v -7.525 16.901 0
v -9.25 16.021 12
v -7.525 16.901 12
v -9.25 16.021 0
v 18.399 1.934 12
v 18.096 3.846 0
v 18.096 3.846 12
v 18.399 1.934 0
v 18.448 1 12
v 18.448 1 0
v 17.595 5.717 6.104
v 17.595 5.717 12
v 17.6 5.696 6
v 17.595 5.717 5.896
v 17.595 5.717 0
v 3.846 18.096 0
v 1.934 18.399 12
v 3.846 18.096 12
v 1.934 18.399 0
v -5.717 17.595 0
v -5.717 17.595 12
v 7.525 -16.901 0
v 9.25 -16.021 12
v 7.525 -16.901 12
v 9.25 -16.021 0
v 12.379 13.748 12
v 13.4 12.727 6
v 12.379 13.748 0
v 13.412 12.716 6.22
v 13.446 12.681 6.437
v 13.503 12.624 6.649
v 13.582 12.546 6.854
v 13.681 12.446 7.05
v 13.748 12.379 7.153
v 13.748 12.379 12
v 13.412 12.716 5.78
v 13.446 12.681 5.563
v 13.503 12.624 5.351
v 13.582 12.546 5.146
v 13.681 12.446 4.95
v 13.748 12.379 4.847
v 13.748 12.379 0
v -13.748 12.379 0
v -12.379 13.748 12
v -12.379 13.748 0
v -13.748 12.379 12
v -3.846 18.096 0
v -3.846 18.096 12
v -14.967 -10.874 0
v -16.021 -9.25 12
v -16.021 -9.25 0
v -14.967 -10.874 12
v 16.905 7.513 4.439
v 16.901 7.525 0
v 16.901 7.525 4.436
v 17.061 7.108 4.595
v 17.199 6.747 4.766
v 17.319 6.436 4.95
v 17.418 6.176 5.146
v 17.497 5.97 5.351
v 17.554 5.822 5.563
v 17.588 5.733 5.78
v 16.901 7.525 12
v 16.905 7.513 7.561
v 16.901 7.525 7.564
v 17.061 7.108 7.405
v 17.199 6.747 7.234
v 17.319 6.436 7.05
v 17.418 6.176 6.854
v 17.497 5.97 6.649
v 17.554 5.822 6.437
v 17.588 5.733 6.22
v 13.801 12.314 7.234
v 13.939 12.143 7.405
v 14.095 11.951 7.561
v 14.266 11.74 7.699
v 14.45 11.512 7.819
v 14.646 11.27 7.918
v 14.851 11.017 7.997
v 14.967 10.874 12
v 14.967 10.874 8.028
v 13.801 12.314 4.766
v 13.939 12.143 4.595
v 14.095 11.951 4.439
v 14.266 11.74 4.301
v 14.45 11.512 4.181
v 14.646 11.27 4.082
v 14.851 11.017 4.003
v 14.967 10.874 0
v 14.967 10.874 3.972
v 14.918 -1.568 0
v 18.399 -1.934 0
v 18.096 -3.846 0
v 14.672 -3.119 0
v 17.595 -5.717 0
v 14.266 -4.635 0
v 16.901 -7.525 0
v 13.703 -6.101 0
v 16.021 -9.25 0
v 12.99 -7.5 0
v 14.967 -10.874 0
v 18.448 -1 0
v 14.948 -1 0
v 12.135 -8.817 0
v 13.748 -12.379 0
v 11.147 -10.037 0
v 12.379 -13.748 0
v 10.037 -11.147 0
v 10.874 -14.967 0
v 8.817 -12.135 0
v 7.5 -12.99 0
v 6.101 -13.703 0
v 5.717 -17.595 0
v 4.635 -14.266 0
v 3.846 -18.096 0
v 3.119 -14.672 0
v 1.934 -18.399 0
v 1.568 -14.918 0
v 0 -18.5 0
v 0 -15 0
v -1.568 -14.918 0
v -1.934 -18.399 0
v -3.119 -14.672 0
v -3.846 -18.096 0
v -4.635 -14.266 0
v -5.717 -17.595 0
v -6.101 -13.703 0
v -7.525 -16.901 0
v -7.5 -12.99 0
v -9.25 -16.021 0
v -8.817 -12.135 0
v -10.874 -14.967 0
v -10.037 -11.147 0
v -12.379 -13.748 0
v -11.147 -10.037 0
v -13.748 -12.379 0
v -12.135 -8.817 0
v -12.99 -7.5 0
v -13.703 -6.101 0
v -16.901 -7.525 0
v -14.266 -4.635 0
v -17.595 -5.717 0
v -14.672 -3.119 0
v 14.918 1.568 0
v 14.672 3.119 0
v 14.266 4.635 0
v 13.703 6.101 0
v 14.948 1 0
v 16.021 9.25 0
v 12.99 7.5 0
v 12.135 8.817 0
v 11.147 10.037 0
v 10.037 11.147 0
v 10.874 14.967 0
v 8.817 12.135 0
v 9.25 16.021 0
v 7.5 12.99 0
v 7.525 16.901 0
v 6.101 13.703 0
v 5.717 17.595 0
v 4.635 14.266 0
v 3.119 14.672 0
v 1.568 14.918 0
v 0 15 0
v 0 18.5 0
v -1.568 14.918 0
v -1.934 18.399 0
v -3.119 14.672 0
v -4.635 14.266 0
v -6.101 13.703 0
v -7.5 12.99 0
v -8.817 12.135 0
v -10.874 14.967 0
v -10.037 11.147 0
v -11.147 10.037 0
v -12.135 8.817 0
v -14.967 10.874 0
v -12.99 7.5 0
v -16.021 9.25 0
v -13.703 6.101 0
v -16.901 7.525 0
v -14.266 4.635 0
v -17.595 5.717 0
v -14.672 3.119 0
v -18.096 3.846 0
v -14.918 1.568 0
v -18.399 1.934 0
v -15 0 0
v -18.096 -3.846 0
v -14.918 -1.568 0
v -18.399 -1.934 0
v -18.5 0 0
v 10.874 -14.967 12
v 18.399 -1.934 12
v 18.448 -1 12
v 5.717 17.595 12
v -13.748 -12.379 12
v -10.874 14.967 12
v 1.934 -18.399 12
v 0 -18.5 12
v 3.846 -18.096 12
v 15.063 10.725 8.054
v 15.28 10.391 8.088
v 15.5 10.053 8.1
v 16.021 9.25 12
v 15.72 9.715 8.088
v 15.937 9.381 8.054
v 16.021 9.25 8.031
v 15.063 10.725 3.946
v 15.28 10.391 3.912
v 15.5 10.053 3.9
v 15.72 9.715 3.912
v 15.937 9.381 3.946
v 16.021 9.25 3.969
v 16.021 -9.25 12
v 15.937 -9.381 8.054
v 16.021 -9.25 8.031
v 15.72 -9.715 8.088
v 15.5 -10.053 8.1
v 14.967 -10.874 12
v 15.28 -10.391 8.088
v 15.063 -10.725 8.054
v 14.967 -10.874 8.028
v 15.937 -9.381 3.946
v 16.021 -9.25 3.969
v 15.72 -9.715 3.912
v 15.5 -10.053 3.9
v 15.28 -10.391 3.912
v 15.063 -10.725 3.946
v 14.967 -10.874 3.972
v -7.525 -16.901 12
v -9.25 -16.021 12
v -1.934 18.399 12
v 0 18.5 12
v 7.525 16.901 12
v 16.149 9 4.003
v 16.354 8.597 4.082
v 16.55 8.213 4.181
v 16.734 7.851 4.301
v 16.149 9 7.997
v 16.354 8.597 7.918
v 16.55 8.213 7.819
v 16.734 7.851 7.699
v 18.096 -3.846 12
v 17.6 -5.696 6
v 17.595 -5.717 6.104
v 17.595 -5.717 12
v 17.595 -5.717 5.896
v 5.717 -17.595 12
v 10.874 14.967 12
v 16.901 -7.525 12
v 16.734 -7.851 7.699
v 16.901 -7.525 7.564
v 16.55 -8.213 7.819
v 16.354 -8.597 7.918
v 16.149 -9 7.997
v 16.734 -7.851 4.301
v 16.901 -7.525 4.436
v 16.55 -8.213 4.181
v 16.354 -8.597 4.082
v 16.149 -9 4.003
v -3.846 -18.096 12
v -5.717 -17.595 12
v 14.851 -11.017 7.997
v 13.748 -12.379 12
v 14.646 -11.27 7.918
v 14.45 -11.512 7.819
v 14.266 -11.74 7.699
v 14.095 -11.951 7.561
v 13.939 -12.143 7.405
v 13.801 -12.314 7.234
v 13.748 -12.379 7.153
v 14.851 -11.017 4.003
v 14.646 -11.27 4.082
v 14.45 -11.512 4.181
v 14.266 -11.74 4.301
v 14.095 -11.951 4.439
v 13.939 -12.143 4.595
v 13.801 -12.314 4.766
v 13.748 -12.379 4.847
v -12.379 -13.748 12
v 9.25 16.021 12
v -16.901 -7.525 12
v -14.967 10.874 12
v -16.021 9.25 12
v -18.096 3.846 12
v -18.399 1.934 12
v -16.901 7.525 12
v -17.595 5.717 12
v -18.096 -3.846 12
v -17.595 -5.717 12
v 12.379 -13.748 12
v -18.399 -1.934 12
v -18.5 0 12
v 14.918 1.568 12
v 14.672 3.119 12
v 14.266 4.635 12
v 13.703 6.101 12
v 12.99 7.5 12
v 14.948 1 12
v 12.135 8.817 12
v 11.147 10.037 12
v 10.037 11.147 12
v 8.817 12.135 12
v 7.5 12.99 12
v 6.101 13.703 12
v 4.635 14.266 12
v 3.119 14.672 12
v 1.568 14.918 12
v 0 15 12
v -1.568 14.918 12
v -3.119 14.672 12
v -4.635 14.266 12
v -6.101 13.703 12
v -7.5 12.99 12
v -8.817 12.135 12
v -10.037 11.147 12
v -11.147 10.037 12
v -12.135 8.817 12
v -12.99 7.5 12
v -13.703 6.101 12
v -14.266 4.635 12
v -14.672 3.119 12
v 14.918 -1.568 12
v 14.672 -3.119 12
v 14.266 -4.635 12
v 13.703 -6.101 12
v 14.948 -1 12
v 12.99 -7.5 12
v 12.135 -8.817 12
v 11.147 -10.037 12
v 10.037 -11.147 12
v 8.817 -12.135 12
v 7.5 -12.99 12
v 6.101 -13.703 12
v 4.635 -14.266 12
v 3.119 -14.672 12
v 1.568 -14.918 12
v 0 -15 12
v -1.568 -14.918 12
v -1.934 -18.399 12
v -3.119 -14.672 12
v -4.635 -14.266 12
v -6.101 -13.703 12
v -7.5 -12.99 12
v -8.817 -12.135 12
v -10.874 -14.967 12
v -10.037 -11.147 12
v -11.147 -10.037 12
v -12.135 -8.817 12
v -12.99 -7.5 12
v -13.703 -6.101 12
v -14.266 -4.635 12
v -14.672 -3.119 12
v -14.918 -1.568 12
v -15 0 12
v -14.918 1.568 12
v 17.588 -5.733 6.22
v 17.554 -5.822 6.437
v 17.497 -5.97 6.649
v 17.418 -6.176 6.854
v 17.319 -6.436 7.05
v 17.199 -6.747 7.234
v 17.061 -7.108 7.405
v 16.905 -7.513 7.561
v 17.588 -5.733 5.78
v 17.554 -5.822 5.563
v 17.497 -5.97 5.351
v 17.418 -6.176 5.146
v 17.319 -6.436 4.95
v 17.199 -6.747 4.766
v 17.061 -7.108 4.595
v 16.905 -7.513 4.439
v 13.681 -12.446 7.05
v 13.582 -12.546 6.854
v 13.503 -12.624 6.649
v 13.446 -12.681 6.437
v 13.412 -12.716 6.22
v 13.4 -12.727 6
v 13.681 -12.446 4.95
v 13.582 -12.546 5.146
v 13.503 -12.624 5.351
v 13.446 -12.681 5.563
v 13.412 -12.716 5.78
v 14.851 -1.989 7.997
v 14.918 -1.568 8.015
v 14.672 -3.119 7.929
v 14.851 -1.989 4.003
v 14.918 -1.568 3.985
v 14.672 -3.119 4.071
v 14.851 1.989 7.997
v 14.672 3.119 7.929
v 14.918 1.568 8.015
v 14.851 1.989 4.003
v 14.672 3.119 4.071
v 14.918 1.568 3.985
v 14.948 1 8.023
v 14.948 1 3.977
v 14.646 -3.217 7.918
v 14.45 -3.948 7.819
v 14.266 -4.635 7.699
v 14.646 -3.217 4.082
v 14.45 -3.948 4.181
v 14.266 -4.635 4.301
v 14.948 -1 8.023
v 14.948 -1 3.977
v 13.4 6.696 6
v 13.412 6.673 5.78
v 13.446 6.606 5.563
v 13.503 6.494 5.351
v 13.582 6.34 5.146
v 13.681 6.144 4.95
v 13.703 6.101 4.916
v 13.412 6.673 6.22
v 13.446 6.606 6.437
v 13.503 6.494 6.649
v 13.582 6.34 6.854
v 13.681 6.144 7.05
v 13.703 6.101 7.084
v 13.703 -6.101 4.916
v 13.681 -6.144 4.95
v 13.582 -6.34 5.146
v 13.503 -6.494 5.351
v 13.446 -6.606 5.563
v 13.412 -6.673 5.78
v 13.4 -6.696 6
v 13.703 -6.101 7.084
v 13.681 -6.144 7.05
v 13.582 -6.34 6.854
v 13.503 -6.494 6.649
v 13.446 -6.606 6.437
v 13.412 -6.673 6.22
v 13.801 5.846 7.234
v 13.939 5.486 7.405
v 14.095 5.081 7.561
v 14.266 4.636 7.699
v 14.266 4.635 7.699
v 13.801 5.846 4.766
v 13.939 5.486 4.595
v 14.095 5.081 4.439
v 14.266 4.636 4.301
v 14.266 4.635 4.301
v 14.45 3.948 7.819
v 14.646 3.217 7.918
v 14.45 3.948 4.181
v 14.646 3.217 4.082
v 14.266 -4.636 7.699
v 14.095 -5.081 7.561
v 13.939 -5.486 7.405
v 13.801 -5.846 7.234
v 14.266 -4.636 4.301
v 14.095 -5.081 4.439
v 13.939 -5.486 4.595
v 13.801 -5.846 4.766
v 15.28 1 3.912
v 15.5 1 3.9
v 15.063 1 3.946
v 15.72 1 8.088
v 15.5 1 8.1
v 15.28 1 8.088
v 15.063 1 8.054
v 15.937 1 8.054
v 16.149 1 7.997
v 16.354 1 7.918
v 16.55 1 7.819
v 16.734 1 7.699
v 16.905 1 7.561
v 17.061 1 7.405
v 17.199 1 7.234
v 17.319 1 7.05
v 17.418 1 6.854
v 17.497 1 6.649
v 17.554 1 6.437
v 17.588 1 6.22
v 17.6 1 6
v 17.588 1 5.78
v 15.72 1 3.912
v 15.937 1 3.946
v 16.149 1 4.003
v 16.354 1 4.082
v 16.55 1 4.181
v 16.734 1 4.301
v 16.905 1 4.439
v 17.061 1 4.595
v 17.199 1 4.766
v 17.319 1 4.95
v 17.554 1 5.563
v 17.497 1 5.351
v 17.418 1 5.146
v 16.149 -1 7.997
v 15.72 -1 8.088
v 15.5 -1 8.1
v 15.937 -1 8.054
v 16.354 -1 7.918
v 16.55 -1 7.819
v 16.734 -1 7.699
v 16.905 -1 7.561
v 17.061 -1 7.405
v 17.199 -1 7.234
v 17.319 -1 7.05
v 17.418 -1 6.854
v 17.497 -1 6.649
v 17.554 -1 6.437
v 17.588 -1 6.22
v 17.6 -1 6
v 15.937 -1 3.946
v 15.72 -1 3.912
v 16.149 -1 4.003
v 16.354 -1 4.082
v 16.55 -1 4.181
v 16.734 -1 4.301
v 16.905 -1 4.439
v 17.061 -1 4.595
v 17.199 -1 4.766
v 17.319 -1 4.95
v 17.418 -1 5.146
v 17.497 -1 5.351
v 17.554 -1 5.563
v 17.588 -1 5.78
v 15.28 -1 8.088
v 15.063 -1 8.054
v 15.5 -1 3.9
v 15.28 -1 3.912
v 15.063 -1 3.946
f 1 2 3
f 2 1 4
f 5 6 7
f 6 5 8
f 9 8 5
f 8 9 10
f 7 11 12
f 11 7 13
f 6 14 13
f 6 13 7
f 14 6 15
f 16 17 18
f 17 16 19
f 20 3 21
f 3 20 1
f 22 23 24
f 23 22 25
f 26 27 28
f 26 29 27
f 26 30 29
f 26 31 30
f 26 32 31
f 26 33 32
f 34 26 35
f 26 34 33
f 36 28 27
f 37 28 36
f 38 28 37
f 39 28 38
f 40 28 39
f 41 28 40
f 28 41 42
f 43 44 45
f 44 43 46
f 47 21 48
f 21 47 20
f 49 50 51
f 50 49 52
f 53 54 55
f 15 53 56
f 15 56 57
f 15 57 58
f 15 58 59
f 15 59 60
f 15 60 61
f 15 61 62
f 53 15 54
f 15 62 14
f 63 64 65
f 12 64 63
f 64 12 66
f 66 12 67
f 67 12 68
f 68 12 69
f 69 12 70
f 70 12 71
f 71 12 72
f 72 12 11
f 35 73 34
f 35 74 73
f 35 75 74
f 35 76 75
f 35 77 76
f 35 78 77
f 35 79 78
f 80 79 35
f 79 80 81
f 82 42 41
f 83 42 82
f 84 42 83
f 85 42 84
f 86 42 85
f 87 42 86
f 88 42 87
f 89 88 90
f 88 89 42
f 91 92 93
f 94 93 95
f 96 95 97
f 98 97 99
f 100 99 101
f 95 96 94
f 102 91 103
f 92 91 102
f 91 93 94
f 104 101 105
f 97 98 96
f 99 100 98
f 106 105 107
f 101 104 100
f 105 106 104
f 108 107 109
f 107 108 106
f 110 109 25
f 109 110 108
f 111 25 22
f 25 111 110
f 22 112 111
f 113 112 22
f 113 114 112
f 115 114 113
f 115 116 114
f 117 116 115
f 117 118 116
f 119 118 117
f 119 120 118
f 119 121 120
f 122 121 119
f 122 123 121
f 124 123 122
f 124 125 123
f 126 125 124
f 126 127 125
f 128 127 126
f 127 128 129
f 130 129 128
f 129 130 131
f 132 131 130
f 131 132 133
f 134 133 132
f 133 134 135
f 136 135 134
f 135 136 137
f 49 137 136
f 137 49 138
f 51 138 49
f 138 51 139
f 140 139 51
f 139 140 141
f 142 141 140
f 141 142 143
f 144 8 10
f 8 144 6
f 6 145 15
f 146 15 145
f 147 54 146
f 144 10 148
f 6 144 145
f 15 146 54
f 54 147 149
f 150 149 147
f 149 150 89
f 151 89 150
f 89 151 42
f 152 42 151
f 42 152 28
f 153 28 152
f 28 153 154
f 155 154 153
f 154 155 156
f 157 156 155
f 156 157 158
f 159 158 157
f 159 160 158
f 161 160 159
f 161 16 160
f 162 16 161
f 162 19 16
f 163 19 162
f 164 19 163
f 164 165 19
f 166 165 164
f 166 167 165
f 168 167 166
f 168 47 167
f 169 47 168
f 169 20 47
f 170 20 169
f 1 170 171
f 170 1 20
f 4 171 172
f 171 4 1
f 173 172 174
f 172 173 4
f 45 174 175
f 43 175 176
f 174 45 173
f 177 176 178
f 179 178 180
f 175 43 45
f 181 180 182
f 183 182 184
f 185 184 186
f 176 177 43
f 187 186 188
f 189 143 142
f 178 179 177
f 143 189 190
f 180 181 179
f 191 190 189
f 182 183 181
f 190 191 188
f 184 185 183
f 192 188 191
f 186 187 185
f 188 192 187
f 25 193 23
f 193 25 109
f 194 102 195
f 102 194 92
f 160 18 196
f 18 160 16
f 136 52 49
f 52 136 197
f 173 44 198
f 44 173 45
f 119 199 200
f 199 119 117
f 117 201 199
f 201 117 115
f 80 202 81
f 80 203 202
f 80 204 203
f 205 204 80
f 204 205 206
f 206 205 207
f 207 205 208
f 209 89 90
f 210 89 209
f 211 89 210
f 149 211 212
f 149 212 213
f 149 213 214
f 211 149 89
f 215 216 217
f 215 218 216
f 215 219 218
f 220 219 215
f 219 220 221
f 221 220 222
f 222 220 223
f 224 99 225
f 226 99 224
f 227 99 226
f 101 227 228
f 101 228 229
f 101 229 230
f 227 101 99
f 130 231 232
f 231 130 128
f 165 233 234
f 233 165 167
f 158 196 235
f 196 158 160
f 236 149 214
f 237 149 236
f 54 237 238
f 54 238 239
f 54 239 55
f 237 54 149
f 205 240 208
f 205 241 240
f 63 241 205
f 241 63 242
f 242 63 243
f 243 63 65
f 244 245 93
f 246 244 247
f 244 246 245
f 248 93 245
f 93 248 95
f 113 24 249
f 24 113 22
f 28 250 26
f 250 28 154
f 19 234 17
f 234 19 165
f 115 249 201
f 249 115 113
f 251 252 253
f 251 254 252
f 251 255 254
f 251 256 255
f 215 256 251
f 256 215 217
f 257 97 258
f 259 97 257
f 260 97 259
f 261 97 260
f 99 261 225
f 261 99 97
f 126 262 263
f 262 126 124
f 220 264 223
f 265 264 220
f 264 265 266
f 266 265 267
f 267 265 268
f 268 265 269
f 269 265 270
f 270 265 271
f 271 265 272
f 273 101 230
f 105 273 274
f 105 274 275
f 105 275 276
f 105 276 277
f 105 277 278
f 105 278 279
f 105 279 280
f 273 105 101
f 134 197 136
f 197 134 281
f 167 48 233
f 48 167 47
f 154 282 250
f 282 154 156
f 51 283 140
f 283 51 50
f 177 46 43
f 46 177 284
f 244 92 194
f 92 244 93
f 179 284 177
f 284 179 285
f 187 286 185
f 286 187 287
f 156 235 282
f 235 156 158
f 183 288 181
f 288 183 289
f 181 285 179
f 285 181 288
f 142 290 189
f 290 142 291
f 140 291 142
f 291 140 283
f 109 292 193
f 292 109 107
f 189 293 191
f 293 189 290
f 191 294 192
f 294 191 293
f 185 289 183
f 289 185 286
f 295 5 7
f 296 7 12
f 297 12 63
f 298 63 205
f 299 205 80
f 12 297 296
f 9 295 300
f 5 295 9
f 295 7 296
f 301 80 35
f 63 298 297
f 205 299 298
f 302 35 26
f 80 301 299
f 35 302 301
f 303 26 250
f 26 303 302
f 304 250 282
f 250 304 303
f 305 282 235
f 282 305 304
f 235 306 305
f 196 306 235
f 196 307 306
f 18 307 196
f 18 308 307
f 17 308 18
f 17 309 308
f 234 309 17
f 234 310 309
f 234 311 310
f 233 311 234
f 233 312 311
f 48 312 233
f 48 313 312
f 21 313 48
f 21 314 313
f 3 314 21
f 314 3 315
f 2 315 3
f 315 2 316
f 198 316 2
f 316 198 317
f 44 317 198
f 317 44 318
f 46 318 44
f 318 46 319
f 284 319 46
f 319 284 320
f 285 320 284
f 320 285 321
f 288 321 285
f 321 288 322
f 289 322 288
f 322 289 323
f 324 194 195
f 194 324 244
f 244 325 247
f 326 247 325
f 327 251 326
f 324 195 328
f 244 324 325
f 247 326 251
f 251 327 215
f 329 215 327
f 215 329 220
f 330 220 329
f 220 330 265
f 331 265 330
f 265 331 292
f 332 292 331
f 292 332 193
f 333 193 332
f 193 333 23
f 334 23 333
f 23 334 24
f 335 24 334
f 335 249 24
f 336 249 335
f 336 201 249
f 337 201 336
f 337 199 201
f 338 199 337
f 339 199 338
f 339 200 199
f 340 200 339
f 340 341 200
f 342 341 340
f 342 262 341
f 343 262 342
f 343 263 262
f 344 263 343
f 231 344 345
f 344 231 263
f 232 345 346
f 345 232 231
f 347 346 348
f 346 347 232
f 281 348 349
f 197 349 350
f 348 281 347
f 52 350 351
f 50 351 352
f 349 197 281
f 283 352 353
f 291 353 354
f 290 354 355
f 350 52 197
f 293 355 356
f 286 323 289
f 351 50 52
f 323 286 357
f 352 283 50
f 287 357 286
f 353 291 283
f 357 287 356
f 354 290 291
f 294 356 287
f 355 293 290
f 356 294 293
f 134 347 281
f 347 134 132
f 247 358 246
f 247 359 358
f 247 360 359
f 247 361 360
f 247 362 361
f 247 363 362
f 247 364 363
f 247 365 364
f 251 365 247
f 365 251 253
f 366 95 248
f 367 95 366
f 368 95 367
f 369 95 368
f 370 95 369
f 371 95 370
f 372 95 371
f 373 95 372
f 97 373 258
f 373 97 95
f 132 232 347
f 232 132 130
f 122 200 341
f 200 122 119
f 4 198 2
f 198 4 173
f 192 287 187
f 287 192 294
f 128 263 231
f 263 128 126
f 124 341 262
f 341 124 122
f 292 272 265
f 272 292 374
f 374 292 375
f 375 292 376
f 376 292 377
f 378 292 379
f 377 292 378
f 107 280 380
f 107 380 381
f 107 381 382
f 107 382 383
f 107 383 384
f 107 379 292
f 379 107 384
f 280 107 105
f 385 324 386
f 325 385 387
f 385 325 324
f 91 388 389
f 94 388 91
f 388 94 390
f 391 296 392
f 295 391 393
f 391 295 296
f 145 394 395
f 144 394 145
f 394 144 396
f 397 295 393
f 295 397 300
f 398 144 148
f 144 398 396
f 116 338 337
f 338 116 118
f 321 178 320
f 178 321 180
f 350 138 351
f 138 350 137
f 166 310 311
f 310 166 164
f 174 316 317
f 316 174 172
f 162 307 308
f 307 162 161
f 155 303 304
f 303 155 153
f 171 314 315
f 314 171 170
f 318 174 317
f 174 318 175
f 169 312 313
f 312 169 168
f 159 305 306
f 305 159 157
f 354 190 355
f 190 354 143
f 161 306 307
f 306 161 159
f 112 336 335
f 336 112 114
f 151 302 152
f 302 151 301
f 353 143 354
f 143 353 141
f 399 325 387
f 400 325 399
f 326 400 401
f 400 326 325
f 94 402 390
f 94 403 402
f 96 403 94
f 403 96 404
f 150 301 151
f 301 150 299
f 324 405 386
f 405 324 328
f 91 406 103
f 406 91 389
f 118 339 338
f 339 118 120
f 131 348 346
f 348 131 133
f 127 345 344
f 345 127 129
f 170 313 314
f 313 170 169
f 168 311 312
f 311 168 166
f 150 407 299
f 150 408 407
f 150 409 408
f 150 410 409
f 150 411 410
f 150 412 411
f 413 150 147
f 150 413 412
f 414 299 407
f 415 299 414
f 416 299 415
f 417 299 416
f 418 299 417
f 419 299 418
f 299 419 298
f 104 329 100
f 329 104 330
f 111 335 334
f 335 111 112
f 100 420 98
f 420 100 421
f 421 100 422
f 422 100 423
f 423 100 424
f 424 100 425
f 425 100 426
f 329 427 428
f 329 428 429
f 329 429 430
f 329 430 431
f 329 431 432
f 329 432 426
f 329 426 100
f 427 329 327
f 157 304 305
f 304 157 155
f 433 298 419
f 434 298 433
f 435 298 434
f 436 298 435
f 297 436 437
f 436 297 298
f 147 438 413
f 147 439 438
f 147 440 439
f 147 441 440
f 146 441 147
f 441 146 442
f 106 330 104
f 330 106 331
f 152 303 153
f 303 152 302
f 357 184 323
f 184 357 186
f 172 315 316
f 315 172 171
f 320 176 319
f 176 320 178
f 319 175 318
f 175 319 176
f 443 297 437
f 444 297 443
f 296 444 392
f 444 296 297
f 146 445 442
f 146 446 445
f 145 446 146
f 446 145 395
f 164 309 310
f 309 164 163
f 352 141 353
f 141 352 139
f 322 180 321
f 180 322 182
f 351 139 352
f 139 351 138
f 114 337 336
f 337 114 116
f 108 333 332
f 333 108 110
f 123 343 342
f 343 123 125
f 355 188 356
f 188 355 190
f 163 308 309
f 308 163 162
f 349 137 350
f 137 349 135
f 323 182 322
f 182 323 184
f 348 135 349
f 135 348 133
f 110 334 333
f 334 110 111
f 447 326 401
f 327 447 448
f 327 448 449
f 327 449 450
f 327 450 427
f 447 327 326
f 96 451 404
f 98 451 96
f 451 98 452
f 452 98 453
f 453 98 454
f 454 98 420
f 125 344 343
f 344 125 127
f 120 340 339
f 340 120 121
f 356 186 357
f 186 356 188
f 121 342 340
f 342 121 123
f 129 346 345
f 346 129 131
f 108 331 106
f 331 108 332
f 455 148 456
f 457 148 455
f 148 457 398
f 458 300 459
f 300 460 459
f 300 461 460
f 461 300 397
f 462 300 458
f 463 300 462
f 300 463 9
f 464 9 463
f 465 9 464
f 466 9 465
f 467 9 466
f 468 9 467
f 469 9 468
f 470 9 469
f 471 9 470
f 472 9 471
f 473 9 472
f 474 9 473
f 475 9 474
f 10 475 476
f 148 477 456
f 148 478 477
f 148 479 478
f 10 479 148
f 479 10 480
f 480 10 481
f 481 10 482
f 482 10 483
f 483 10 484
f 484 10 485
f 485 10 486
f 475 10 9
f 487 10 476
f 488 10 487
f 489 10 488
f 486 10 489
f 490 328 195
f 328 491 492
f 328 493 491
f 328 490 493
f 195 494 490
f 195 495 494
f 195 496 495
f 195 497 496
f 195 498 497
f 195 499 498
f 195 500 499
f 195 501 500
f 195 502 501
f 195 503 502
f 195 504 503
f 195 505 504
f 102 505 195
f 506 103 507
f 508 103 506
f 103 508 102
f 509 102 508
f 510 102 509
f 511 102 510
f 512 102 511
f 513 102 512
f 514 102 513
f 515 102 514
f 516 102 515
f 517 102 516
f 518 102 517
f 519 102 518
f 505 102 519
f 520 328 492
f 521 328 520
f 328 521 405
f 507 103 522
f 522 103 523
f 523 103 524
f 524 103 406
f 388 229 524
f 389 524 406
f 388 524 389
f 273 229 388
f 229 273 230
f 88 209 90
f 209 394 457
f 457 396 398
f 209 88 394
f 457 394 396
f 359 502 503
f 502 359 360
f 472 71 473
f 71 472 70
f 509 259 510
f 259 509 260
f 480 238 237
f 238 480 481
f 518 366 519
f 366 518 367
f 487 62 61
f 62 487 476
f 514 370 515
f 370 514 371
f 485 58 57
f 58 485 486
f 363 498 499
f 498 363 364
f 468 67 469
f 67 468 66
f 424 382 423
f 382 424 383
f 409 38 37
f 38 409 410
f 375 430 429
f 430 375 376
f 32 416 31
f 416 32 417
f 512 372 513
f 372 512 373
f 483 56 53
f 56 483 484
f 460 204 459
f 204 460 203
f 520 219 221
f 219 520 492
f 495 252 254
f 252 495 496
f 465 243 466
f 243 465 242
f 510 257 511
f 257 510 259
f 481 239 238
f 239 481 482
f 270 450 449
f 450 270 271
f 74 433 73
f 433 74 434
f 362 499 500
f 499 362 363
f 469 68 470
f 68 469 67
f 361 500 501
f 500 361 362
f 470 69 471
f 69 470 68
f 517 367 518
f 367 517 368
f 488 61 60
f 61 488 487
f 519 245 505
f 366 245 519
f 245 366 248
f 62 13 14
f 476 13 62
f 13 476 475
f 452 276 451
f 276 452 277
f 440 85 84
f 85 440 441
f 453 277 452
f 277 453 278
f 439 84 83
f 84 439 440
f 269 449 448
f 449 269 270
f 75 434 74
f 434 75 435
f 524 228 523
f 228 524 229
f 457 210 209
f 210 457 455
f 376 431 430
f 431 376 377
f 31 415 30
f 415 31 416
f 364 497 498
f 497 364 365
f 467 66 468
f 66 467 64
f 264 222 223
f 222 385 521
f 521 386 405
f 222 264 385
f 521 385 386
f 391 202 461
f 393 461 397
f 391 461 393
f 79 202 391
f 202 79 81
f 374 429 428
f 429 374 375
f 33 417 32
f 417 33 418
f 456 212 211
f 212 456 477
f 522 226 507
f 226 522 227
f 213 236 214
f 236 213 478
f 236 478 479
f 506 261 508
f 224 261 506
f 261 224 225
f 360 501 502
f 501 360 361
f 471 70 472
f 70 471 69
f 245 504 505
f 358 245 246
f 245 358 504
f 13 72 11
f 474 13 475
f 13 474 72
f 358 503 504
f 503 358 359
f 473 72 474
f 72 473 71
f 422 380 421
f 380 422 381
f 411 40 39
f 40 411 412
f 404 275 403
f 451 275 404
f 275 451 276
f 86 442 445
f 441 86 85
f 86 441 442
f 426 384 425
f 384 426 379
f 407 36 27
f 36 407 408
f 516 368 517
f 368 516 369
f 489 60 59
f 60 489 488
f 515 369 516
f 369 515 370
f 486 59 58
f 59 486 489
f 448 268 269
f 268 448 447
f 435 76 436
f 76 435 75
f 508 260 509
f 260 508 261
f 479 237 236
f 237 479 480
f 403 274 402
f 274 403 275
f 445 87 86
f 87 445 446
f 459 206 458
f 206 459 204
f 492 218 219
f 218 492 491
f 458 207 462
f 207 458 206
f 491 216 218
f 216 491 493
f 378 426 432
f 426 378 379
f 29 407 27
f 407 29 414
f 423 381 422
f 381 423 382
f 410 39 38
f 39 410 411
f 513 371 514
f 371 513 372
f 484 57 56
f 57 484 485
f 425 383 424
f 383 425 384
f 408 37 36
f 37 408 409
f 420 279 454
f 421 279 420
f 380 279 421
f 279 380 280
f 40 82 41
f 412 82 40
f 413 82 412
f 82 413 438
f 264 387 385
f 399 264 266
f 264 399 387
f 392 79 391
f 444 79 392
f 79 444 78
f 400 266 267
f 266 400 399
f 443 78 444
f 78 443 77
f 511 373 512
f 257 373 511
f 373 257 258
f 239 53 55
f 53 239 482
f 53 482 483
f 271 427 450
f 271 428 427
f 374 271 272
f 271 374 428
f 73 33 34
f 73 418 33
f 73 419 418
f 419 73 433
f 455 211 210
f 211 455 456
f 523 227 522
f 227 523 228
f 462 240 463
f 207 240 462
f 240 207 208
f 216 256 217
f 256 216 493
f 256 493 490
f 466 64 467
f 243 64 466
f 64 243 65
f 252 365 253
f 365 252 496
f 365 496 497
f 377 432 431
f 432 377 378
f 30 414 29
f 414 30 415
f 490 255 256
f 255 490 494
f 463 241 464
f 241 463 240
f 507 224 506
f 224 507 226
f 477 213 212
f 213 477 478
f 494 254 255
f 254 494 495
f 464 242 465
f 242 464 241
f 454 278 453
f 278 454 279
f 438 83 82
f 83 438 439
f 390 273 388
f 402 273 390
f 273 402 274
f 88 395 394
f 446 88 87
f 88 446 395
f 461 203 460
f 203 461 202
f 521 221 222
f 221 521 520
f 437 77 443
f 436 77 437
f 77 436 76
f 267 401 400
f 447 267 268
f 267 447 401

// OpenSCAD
// C-style pipe clamp.
$fn = 60;
eps = 0.02;
pipe_d = 30;
wall = 3.5;
outer_d = pipe_d + 2 * wall;
width = 12;
slit = 2;
difference() {
    cylinder(d=outer_d,h=width);
    translate([0,0,-eps]) cylinder(d=pipe_d,h=width+2*eps);
    translate([0,-slit/2,-eps]) cube([outer_d/2+eps,slit,width+2*eps]);
    translate([outer_d/2-3,-outer_d/2-eps,width/2]) rotate([-90,0,0]) cylinder(d=4.2,h=outer_d+2*eps);
}
